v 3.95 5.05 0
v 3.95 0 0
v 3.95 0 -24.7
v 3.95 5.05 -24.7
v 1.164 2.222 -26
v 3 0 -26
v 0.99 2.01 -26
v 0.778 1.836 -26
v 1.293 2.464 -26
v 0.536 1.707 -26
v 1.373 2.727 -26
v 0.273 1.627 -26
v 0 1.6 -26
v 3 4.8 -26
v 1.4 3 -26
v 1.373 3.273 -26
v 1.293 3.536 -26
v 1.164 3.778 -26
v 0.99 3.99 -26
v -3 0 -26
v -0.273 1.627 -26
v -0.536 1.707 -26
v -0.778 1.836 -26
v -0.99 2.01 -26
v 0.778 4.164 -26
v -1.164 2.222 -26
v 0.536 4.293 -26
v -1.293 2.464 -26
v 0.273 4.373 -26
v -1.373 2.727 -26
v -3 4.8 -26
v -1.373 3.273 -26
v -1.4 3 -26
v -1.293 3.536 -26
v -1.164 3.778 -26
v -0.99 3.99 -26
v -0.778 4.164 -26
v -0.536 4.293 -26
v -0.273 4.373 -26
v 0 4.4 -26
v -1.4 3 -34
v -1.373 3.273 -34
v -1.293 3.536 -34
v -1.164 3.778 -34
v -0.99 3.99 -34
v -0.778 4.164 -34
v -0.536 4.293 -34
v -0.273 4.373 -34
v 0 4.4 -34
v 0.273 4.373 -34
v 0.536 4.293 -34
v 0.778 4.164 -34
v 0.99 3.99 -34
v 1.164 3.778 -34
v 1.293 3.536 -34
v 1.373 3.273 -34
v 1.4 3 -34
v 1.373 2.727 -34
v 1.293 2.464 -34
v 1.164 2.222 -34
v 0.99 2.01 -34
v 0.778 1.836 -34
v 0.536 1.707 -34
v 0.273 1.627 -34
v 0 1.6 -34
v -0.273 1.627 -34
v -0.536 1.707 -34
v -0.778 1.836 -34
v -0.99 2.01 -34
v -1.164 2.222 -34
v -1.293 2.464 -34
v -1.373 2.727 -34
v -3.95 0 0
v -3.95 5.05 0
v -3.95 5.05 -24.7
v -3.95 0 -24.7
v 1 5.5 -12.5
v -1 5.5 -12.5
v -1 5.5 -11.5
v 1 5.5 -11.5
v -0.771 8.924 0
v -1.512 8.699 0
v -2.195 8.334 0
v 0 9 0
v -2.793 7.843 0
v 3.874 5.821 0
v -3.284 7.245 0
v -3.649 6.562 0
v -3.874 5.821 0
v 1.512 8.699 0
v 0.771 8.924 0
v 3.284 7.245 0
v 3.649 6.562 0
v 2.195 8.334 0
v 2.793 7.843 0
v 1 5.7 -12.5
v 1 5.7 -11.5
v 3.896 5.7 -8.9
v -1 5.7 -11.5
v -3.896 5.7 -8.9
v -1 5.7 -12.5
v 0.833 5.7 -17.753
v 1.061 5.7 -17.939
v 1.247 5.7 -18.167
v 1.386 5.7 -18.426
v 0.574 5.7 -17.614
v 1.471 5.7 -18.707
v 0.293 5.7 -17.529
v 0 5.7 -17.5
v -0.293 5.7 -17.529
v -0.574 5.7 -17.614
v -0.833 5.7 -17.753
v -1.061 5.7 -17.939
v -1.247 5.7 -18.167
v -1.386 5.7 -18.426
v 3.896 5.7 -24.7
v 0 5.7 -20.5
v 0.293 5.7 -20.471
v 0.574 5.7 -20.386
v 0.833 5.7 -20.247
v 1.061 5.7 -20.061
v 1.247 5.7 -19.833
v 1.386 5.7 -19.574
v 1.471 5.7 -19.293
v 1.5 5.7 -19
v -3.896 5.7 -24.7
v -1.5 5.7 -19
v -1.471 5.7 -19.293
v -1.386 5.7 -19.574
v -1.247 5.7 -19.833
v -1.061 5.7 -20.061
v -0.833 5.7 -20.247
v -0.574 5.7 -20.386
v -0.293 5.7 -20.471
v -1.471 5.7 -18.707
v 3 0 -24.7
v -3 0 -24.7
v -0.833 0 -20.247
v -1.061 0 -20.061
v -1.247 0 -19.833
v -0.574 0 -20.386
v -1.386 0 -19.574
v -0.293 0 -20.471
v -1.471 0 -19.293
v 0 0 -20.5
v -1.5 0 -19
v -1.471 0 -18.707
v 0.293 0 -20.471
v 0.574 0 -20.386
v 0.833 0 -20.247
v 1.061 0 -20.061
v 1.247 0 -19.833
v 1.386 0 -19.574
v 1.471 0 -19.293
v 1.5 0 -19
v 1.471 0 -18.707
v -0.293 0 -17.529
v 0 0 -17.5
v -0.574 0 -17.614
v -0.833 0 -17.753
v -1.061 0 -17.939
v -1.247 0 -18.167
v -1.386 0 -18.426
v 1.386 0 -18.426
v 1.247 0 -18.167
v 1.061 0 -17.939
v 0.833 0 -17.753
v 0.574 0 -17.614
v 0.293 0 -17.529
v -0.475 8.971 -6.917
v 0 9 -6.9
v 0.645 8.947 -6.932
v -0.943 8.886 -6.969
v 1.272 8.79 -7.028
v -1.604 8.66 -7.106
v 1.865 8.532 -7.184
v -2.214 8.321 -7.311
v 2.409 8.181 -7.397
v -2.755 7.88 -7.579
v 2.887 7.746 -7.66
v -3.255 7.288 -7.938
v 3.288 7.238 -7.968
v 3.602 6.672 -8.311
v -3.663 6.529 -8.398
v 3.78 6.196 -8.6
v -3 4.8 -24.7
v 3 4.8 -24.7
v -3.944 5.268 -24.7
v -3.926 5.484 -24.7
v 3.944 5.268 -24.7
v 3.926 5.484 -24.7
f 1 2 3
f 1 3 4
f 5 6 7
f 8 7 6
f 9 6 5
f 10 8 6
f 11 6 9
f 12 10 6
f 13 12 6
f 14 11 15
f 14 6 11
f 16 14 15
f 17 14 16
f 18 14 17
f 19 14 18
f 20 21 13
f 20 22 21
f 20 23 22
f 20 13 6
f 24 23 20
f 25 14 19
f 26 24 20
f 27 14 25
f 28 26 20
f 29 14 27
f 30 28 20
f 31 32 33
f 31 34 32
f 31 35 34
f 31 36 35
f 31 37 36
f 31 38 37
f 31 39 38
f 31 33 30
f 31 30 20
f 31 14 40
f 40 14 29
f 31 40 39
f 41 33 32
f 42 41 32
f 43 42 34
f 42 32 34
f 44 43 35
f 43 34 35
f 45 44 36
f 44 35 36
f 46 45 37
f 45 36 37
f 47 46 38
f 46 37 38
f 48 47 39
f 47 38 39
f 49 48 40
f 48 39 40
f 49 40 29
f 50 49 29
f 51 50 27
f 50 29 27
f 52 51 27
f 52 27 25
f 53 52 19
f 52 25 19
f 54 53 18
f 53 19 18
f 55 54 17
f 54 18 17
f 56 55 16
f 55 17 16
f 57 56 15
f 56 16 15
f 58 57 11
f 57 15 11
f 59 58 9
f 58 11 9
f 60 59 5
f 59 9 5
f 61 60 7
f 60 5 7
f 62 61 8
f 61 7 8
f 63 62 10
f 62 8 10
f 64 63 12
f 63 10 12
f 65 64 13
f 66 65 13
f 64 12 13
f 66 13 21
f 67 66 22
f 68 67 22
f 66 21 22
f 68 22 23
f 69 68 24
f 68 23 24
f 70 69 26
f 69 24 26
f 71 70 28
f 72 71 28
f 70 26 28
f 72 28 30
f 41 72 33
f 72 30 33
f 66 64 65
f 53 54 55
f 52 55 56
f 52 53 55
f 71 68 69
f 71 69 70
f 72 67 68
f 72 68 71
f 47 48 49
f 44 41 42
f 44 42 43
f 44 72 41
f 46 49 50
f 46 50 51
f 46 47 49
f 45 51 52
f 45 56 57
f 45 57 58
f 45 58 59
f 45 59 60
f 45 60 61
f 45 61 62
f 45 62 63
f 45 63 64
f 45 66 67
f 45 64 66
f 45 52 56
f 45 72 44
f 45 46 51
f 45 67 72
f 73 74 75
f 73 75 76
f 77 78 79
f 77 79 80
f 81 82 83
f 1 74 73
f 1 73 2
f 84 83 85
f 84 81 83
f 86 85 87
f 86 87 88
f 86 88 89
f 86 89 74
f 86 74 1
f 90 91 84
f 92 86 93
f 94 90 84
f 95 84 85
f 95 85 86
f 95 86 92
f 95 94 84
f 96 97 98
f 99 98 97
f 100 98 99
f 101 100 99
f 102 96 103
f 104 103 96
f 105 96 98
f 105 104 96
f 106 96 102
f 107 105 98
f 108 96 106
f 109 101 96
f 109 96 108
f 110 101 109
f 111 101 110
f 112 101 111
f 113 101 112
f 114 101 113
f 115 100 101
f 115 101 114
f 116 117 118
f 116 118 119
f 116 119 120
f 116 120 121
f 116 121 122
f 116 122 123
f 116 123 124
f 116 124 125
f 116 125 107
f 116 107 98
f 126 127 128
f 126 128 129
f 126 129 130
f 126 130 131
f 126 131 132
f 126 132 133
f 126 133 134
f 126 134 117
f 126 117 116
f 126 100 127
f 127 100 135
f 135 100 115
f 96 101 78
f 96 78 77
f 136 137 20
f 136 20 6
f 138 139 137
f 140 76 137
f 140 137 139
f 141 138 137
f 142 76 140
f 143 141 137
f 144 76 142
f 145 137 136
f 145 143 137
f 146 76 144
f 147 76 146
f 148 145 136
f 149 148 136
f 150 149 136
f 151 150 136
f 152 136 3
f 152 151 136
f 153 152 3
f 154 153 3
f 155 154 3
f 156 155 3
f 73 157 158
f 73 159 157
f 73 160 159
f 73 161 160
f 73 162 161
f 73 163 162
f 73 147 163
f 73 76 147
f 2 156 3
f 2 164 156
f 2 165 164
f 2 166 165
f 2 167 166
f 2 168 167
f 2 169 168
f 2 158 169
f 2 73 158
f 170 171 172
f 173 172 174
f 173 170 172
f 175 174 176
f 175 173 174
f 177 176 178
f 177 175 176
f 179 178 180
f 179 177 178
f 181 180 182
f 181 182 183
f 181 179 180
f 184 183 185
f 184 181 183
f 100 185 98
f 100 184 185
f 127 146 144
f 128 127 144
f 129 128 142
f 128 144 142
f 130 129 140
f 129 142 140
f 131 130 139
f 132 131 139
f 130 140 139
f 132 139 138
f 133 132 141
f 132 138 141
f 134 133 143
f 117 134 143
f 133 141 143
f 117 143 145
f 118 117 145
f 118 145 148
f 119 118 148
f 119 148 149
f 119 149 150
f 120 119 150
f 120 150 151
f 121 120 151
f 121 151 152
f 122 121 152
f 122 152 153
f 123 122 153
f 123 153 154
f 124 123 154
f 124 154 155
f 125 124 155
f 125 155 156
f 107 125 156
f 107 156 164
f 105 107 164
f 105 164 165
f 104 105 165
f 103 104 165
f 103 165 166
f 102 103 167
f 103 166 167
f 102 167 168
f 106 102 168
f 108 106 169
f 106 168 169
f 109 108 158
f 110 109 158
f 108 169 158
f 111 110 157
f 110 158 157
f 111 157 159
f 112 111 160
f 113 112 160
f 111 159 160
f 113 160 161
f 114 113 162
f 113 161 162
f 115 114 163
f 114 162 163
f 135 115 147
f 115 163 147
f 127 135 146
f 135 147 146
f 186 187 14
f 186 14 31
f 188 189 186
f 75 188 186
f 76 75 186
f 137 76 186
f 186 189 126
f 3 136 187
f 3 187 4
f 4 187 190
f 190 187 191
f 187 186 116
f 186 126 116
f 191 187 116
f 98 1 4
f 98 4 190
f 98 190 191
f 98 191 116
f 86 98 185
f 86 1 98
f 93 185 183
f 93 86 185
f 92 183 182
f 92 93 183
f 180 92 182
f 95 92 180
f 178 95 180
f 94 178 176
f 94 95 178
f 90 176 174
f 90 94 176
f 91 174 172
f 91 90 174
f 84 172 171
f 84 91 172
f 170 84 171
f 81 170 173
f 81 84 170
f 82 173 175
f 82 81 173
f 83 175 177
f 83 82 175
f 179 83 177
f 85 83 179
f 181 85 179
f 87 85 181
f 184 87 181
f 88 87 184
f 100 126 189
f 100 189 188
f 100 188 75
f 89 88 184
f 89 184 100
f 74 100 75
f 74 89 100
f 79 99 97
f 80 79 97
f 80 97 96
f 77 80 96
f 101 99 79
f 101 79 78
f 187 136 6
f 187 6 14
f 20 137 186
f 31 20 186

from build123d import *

# Parameters (mm, degrees)
BOSS_EXTRU_1_DEPTH           = 24.7
ENL_V_MAT_EXTRU_1_DEPTH      = 27.583688608
ENL_V_MAT_EXTRU_1_DEPTH_BACK = 27.583688608
D_GAGEMENT_M31_D             = 3
ESQUISSE5_W                  = 6
ESQUISSE5_H                  = 4.8
BOSS_EXTRU_2_DEPTH           = 1.3
ESQUISSE6_R                  = 1.4
BOSS_EXTRU_3_DEPTH           = 8
ESQUISSE7_W                  = 2
ESQUISSE7_H                  = 1
ENL_V_MAT_EXTRU_2_DEPTH      = 0.2


with BuildPart() as part:
    # Esquisse1 → Boss.-Extru.1 (new body)
    with BuildSketch(Plane.XY):
        with BuildLine():
            Line((-3.95, 5.05), (-3.95, 0))
            Line((-3.95, 0), (3.95, 0))
            Line((3.95, 0), (3.95, 5.05))
            ThreePointArc((3.95, 5.05), (0, 9), (-3.95, 5.05))
        make_face()
    extrude(amount=-BOSS_EXTRU_1_DEPTH)

    # Esquisse2 → Enlèv. mat.-Extru.1 (cut, two sides: drawn at the far end of the back side and taken through both)
    with BuildSketch(Plane(origin=(0, 0, 0), x_dir=(0, 0, -1), z_dir=(1, 0, 0)).offset(-ENL_V_MAT_EXTRU_1_DEPTH_BACK)):
        Polygon((6.9, 9), (8.9, 5.7), (24.7, 5.7), (24.7, 9), align=None)
    extrude(amount=ENL_V_MAT_EXTRU_1_DEPTH + ENL_V_MAT_EXTRU_1_DEPTH_BACK, mode=Mode.SUBTRACT)

    # Dégagement M31 (through all)
    with Locations(Plane(origin=(0, 5.7, 0), x_dir=(1, 0, 0), z_dir=(0, 1, 0))):
        with Locations((0, 19)):
            Hole(D_GAGEMENT_M31_D / 2)

    # Esquisse5 → Boss.-Extru.2 (add)
    with BuildSketch(Plane(origin=(0, 0, -24.7), x_dir=(-1, 0, 0), z_dir=(0, 0, -1))):
        with Locations((0, 2.4)):
            Rectangle(ESQUISSE5_W, ESQUISSE5_H)
    extrude(amount=BOSS_EXTRU_2_DEPTH)

    # Esquisse6 → Boss.-Extru.3 (add)
    with BuildSketch(Plane(origin=(0, 0, -26), x_dir=(-1, 0, 0), z_dir=(0, 0, -1))):
        with Locations((0, 3)):
            Circle(ESQUISSE6_R)
    extrude(amount=BOSS_EXTRU_3_DEPTH)

    # Esquisse7 → Enlèv. mat.-Extru.2 (cut)
    with BuildSketch(Plane(origin=(0, 5.7, 0), x_dir=(1, 0, 0), z_dir=(0, 1, 0))):
        with Locations((0, 12)):
            Rectangle(ESQUISSE7_W, ESQUISSE7_H)
    extrude(amount=-ENL_V_MAT_EXTRU_2_DEPTH, mode=Mode.SUBTRACT)


solid = part.part
